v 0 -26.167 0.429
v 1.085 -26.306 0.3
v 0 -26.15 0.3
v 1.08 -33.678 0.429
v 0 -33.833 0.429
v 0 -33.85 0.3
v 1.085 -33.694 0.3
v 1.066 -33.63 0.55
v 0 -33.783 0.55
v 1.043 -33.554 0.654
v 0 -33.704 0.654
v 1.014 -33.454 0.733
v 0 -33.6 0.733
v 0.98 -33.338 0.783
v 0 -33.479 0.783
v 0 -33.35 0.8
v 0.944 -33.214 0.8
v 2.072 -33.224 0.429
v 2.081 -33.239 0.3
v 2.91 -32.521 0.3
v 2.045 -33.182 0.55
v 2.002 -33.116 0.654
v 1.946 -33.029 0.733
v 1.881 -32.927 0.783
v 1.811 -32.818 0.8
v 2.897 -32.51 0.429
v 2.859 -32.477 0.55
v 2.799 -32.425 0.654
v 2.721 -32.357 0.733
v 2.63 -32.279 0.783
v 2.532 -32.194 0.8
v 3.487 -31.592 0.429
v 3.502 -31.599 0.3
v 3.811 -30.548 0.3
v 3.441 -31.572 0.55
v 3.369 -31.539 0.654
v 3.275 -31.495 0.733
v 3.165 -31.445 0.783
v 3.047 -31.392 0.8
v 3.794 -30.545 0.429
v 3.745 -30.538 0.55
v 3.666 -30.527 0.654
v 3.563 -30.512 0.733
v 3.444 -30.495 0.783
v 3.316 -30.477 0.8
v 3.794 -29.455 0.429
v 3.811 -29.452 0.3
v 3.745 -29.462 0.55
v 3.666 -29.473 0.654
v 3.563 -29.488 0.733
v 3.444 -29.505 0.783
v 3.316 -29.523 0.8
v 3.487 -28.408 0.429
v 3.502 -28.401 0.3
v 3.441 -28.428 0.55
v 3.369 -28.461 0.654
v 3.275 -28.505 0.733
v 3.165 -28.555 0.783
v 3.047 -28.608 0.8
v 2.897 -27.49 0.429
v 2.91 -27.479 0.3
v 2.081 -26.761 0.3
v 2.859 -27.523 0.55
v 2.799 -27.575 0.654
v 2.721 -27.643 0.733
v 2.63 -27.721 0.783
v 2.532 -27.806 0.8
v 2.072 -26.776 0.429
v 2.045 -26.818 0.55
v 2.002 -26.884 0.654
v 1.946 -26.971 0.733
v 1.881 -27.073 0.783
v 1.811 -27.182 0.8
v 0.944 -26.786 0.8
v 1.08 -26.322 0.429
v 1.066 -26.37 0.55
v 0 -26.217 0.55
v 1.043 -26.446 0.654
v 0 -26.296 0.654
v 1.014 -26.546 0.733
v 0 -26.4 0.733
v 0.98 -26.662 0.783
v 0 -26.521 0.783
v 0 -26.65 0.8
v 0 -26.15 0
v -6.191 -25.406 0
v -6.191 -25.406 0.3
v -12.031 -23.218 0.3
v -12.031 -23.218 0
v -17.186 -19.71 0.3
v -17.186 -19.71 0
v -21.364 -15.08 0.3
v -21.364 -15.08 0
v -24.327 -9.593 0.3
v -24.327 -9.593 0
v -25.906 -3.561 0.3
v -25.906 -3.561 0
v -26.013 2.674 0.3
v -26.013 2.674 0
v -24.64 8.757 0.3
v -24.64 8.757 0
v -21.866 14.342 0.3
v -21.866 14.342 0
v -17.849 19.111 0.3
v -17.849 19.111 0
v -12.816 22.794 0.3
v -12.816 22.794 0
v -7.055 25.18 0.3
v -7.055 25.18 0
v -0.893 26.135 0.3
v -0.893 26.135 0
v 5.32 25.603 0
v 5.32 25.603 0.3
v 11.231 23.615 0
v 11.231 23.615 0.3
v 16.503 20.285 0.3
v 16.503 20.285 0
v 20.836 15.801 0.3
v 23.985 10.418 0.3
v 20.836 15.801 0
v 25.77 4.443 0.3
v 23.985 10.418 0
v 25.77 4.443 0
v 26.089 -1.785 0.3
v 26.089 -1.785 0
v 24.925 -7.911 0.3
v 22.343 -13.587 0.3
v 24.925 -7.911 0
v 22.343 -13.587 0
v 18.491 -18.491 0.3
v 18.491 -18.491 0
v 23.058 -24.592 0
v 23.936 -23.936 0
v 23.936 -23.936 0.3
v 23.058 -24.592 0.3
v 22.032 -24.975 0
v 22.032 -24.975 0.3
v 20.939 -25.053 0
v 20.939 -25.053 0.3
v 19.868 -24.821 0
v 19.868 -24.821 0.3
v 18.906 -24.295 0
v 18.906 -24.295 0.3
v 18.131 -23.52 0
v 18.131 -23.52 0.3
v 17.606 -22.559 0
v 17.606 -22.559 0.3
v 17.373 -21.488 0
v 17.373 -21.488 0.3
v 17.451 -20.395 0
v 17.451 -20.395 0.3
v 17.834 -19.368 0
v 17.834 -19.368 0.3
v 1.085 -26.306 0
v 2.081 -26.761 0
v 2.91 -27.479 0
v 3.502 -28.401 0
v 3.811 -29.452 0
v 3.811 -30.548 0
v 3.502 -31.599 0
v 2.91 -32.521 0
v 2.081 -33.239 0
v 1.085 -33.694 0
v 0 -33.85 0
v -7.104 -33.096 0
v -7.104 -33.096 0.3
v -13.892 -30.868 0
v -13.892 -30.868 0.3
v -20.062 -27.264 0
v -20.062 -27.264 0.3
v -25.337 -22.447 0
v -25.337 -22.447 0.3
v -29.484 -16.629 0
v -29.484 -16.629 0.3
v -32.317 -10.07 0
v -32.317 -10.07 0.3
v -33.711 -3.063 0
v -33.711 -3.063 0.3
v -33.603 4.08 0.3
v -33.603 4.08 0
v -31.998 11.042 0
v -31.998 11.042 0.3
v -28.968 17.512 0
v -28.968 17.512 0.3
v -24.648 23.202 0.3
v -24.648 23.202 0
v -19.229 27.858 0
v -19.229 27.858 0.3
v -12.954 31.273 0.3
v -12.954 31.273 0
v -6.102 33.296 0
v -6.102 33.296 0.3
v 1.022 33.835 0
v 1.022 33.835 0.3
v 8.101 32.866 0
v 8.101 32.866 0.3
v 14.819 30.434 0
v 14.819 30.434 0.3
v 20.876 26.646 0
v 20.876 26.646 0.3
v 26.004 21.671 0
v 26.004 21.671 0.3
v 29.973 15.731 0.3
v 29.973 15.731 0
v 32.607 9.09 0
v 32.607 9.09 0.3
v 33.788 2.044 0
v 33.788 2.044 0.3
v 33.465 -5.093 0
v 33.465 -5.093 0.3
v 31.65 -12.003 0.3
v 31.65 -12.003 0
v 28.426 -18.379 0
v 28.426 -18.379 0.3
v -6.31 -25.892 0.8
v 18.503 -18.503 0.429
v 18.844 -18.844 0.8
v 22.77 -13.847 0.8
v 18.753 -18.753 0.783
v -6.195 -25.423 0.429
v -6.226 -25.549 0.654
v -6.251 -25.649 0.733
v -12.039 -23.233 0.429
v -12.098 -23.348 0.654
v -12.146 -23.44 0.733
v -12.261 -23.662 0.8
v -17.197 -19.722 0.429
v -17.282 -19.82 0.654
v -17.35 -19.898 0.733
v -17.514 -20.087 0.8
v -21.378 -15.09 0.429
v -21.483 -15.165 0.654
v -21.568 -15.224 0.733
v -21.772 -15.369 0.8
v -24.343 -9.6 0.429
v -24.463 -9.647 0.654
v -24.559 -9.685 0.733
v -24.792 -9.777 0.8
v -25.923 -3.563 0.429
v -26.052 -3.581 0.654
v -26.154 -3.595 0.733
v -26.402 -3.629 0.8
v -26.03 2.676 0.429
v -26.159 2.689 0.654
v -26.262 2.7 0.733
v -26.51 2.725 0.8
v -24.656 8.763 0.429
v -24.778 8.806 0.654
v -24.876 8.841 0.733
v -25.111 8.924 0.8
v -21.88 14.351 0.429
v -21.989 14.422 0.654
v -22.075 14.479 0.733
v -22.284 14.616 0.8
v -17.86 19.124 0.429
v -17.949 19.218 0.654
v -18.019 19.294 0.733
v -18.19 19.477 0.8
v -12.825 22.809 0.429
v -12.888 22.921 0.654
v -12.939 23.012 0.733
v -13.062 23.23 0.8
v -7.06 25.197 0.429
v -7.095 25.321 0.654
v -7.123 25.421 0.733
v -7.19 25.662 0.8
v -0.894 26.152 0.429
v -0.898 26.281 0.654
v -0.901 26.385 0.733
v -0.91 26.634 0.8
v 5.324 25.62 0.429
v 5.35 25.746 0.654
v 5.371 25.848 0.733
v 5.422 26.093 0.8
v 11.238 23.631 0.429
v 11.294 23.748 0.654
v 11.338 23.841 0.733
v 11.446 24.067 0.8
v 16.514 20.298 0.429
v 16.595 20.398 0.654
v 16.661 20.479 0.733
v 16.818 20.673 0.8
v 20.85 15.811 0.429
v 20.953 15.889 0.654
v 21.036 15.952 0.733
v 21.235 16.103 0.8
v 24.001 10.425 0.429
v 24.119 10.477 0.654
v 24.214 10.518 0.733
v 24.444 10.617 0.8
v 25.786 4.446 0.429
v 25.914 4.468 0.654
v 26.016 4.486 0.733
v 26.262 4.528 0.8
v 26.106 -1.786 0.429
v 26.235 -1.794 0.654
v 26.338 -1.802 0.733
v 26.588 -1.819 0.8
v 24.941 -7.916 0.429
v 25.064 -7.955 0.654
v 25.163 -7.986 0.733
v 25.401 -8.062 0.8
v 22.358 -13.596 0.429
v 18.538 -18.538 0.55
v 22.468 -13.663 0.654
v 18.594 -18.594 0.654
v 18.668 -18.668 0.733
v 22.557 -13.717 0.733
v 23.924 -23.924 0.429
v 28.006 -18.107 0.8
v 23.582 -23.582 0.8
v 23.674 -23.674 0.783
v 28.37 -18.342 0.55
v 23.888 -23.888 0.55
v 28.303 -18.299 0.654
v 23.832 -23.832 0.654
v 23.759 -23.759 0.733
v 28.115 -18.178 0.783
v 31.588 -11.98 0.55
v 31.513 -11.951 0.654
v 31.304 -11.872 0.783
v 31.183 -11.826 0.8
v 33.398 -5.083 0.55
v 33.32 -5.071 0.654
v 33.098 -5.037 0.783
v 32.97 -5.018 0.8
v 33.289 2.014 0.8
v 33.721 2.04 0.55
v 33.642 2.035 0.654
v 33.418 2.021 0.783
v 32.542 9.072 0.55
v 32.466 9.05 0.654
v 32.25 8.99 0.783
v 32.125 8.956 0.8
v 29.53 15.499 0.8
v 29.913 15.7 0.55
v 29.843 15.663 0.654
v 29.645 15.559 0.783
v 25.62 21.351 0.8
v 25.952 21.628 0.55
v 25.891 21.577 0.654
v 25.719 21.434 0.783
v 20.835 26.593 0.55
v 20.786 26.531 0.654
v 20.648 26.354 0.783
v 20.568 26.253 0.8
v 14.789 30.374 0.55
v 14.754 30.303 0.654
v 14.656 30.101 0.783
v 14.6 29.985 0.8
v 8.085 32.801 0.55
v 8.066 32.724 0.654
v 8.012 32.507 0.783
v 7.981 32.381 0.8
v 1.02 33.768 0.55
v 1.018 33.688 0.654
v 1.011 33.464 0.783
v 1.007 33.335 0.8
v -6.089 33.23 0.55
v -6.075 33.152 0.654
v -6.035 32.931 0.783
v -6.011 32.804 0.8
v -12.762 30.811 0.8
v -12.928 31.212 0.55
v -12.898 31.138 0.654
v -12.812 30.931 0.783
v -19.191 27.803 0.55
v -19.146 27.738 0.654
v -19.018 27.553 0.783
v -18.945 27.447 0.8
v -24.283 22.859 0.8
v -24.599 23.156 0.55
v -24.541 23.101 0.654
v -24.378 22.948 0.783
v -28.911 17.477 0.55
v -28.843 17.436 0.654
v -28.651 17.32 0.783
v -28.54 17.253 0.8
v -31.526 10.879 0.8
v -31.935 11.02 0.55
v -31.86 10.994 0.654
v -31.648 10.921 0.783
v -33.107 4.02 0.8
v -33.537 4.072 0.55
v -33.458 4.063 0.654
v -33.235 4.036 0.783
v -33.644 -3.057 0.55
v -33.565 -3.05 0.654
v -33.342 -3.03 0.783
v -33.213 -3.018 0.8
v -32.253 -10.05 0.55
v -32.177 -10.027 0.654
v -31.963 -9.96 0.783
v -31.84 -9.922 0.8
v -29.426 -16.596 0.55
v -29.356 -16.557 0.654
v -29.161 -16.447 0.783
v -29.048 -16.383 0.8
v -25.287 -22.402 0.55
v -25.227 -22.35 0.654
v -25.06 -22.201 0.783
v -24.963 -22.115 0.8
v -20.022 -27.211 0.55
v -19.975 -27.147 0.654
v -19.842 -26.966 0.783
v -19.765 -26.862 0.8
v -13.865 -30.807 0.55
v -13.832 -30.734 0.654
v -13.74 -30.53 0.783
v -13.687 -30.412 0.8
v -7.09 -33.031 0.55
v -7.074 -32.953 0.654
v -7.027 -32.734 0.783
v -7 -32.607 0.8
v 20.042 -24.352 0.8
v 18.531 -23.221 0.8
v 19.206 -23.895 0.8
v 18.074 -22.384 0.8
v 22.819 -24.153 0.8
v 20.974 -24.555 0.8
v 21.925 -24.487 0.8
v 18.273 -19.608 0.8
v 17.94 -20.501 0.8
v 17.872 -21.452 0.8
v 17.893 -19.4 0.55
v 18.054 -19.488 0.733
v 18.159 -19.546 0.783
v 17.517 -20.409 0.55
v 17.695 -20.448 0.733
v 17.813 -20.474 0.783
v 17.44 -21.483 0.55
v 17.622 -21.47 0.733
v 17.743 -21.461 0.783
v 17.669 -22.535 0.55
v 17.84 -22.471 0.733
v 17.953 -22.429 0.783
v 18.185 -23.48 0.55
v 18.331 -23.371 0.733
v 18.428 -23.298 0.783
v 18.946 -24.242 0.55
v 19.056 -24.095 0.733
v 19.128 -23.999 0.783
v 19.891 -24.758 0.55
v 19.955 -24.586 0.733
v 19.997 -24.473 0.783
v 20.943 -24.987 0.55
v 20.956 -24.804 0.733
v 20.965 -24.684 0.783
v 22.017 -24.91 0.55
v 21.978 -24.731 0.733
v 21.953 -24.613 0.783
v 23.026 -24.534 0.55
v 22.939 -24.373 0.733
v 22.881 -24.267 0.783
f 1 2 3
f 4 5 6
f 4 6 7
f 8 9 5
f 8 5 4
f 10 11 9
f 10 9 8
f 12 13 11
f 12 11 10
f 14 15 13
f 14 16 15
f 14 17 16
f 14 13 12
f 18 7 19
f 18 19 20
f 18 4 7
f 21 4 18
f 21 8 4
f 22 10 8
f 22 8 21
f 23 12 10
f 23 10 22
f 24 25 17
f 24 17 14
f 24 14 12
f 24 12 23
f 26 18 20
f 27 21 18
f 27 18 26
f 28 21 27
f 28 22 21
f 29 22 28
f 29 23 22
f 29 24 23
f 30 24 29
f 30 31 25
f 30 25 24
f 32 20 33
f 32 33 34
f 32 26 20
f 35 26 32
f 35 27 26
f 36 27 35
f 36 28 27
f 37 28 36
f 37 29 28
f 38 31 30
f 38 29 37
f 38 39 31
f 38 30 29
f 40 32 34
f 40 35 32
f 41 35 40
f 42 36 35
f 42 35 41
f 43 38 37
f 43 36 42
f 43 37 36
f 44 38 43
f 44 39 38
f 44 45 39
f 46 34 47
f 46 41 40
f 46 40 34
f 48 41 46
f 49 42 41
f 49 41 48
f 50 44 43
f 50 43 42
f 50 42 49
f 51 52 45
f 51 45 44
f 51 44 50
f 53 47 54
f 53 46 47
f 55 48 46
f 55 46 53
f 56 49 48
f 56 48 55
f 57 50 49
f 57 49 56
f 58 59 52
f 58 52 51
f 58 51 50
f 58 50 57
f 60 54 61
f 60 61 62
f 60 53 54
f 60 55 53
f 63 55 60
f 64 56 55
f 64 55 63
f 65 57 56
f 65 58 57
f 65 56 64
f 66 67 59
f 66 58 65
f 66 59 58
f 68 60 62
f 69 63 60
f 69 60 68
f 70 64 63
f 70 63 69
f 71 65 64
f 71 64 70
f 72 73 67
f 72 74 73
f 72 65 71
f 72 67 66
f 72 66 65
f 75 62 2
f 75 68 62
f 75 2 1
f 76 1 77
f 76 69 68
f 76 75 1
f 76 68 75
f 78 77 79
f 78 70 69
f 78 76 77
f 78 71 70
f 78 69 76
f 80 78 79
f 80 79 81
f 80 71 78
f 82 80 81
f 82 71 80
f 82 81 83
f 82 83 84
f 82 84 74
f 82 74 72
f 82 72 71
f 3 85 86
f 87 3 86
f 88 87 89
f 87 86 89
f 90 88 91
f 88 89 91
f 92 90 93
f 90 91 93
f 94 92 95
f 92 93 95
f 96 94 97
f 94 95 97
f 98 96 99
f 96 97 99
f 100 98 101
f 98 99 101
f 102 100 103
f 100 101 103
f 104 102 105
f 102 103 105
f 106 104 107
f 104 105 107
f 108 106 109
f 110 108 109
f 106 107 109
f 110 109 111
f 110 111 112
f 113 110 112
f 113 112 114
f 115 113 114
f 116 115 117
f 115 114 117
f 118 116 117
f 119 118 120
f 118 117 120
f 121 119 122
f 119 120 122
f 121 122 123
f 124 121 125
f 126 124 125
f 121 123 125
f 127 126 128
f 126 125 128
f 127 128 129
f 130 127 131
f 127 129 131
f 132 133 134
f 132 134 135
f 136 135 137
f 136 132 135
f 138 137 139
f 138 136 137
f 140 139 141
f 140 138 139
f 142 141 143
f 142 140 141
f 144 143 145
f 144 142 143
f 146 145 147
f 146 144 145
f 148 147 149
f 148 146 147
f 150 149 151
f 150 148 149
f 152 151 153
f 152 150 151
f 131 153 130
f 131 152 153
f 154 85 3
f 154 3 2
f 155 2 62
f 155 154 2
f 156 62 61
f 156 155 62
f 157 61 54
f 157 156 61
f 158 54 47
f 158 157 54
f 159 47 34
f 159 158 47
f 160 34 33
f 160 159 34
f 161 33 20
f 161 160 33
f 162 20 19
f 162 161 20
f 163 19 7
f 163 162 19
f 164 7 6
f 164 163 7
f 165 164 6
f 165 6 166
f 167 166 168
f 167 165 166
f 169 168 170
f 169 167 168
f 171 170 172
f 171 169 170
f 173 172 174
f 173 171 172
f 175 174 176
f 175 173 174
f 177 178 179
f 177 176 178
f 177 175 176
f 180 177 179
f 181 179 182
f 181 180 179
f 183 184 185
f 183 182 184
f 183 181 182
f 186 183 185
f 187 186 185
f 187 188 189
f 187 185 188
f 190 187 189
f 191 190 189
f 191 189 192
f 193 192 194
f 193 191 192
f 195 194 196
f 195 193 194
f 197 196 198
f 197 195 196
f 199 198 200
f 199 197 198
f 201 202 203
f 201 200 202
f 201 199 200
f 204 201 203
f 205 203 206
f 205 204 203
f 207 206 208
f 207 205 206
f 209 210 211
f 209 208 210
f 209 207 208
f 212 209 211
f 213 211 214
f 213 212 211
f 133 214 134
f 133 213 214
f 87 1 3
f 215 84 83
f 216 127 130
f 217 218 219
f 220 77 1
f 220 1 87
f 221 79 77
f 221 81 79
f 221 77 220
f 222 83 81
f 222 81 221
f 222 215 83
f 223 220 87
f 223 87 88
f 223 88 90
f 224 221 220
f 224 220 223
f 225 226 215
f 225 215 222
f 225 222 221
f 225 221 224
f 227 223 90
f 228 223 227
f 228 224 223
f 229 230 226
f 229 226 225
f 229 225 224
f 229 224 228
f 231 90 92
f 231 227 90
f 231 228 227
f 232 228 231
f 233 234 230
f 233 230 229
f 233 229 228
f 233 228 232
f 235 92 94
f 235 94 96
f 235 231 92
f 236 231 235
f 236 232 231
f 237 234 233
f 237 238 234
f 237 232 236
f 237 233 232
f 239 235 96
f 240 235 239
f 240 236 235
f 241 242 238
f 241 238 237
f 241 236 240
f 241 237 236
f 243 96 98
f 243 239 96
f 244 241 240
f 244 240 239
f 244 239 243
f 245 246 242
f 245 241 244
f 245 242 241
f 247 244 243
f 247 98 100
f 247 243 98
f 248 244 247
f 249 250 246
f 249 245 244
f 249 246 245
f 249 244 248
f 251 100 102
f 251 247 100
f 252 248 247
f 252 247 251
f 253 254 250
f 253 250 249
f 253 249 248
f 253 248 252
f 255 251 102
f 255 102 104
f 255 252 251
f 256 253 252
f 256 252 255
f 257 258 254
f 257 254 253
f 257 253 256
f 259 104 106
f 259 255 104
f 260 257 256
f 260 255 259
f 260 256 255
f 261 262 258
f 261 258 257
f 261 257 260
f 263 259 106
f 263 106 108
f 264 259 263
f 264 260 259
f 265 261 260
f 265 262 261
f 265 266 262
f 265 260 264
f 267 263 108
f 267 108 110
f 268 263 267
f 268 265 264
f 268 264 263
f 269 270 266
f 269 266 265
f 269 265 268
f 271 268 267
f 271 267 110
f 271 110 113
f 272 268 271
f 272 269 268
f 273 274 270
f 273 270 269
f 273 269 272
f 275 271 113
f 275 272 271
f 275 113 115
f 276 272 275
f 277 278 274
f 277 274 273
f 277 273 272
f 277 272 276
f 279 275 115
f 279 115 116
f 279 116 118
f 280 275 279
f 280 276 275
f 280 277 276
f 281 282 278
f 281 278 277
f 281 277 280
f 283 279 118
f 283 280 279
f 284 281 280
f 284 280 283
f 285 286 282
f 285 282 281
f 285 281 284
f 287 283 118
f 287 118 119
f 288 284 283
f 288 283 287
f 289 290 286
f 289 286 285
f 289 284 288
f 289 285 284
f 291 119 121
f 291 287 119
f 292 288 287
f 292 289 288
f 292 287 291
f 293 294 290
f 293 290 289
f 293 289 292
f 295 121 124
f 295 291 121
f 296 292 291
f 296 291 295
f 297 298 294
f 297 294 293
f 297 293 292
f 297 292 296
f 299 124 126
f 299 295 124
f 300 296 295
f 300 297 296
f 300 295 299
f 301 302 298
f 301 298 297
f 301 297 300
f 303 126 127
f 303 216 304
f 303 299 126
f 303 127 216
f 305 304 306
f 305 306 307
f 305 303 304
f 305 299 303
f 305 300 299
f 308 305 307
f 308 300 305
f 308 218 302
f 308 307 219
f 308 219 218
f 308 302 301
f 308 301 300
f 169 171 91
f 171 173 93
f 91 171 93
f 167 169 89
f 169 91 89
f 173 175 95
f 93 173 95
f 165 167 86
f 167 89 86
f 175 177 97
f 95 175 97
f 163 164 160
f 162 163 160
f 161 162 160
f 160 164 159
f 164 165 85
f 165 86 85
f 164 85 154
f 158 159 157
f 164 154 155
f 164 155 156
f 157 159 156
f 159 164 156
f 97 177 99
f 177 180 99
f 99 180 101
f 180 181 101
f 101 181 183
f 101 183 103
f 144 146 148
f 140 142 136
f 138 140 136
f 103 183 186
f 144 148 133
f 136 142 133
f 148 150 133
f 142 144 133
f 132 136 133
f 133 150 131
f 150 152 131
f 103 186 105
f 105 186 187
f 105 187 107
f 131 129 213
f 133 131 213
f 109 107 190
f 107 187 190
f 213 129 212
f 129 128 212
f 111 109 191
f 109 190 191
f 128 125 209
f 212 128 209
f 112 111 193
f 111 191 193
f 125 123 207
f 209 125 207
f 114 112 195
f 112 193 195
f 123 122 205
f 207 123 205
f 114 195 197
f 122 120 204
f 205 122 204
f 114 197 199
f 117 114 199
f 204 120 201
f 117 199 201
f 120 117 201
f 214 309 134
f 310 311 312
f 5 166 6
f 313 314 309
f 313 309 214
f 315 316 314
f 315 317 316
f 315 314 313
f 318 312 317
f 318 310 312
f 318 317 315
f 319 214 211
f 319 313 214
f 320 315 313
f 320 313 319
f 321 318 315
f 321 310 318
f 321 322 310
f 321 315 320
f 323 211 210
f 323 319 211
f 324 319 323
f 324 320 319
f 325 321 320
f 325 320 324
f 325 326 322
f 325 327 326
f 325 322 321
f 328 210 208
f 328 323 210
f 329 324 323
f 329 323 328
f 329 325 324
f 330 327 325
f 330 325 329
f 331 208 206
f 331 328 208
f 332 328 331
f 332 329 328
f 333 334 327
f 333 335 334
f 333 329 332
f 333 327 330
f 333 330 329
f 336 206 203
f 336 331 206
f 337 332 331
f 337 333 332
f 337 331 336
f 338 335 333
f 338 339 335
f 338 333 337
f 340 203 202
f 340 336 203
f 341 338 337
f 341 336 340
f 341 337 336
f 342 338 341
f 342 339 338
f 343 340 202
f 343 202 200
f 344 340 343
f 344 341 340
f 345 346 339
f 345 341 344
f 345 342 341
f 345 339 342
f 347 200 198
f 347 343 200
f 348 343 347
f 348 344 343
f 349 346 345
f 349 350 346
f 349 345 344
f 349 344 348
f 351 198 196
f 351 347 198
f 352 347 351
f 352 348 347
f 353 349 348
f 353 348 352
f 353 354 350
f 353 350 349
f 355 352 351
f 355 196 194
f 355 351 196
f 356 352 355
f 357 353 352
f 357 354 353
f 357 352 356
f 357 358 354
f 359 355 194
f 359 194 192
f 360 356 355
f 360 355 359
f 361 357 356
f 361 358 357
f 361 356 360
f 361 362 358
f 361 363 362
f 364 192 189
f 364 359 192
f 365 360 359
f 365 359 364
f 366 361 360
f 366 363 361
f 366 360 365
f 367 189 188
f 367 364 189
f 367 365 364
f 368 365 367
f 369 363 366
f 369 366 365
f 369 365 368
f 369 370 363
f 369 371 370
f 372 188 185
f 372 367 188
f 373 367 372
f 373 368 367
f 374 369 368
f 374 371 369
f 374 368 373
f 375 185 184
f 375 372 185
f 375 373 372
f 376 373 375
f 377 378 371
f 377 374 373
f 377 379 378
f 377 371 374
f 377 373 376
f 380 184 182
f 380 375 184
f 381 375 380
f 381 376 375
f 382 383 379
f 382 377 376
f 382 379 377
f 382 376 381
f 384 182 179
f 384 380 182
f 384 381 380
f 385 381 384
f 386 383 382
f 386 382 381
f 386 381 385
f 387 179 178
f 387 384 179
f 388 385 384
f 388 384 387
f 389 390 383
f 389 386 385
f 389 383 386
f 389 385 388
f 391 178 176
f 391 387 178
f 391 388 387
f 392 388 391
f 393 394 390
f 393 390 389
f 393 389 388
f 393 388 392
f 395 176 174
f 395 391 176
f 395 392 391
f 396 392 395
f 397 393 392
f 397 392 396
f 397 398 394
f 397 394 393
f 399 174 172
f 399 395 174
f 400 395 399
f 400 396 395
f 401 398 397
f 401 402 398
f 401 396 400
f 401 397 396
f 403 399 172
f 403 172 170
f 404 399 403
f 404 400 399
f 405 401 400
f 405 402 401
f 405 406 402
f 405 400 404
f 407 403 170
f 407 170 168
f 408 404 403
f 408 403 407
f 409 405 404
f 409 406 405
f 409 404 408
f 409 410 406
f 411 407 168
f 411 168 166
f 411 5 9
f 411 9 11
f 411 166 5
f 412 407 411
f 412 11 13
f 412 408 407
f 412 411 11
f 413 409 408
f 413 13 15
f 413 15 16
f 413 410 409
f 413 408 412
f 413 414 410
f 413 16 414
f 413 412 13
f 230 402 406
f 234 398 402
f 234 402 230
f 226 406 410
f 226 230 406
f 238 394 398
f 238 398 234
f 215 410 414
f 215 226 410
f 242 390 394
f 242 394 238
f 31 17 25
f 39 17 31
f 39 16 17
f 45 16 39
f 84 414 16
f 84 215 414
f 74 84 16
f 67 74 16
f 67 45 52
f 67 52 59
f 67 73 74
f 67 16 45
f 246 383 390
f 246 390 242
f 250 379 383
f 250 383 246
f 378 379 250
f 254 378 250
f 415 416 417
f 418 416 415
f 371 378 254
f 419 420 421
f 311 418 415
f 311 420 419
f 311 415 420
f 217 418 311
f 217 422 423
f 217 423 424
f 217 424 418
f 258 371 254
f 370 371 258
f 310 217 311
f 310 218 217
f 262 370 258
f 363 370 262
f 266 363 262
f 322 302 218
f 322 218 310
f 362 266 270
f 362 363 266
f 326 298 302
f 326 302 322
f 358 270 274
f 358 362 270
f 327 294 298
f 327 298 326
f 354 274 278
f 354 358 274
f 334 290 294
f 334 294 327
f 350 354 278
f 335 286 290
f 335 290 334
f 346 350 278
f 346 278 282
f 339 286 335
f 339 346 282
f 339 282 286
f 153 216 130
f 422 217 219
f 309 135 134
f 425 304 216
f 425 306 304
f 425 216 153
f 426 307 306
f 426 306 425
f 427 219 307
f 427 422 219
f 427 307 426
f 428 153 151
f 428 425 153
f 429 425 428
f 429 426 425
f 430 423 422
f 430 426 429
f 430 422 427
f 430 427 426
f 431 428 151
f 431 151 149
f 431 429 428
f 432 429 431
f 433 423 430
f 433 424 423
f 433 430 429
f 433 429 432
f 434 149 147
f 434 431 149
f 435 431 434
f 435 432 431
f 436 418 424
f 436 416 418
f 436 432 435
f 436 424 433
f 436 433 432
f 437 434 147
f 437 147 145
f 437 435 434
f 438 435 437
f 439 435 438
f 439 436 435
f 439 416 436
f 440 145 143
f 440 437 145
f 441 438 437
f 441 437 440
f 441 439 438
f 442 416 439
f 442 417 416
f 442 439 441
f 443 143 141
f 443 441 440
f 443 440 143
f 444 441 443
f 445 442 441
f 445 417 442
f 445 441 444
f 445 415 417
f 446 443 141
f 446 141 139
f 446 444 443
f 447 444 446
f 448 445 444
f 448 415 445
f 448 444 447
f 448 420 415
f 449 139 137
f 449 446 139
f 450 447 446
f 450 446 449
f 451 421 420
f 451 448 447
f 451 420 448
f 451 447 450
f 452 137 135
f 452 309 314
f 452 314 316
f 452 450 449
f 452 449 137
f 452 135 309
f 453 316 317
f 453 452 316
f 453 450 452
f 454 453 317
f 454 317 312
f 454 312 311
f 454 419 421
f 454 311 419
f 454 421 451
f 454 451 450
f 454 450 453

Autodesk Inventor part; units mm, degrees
ref_plane "YZ Plane" through (0, 0, 0) normal (1, 0, 0) x (0, 1, 0)
ref_plane "XZ Plane" through (0, 0, 0) normal (0, 1, 0) x (-1, 0, 0)
ref_plane "XY Plane" through (0, 0, 0) normal (0, 0, 1) x (1, 0, 0)
sketch "Block1" plane through (0, 0, 0) normal (0, 0, 1) x (1, 0, 0)
  circle A0 centre (250, 0) radius 40 construction
  arc A1 (284, 0) -> (274.0416, -24.0416) centre (250, 0) ccw construction
  circle A2 centre (250, 0) radius 10.05 construction
  arc A3 (276, 0) -> (268.3848, -18.3848) centre (250, 0) ccw construction
  circle A4 centre (280, 0) radius 1.6 construction
  arc A5 (276, 0) -> (284, 0) centre (280, 0) ccw construction
  circle A6 centre (271.2132, -21.2132) radius 1.6 construction
  arc A7 (274.0416, -24.0416) -> (268.3848, -18.3848) centre (271.2132, -21.2132) ccw construction
  point P0 (269.205, -7.955)
  dimension "d0" = 8
sketch "Sketch1" plane through (0, 0, 0) normal (0, 0, 1) x (1, 0, 0)
  arc A0 (18.4908, -18.4908) -> (0, -26.15) centre (0, 0) ccw
  arc A1 (23.9356, -23.9356) -> (0, -33.85) centre (0, 0) ccw
  arc A2 (0, -33.85) -> (0, -26.15) centre (0, -30) ccw
  circle A3 centre (0, -30) radius 2.9
  arc A4 (18.4908, -18.4908) -> (23.9356, -23.9356) centre (21.2132, -21.2132) ccw
  circle A5 centre (21.2132, -21.2132) radius 2.9
  circle A6 centre (30, 0) radius 2.9
  circle A7 centre (21.2132, 21.2132) radius 2.9
  circle A8 centre (0, 30) radius 2.9
  circle A9 centre (-21.2132, 21.2132) radius 2.9
  circle A10 centre (-30, 0) radius 2.9
  circle A11 centre (-21.2132, -21.2132) radius 2.9
  point P0 (0, 0)
  point P1 (0, 0)
  dimension "d1" = 0.15
  dimension "d2" = 5.8
  dimension "d5" = 360
extrude "Extrusion1" add sketch "Sketch1" along normal blind 0.2
sketch "Sketch2" plane through (0, 0, 0.2) normal (0, 0, 1) x (1, 0, 0)
  arc A0 (23.9356, -23.9356) -> (0, -33.85) centre (0, 0) ccw projected
  arc A1 (0, -33.85) -> (0, -26.15) centre (0, -30) ccw projected
  arc A2 (18.4908, -18.4908) -> (0, -26.15) centre (0, 0) ccw projected
  arc A3 (18.4908, -18.4908) -> (23.9356, -23.9356) centre (21.2132, -21.2132) ccw projected
  circle A4 centre (0, 30) radius 2.9 projected
  circle A5 centre (30, 0) radius 2.9 projected
  circle A6 centre (21.2132, -21.2132) radius 2.9 projected
  circle A7 centre (-30, 0) radius 2.9 projected
  circle A8 centre (-21.2132, -21.2132) radius 2.9 projected
  circle A9 centre (-21.2132, 21.2132) radius 2.9 projected
  circle A10 centre (21.2132, 21.2132) radius 2.9 projected
  circle A11 centre (0, -30) radius 2.9 projected
  point P0 (0, 0)
extrude "Extrusion2" add sketch "Sketch2" along normal blind 0.6 contours A3 A2 A1 A0 | A4 | A5 | A6 | A7 | A8 | A9 | A10 | A11
fillet "Fillet1" radius 0.5 4 edges at (3.85, -30, 0.8) (-10.0072, 24.1594, 0.8) (18.4908, -23.9356, 0.8) (-12.9538, 31.2733, 0.8)
sketch "Sketch3" plane through (0, 0, 0) normal (0, 0, -1) x (-1, 0, 0)
  circle A0 centre (0, -30) radius 2.9 projected
  circle A1 centre (-21.2132, -21.2132) radius 2.9 projected
  circle A2 centre (-30, 0) radius 2.9 projected
  circle A3 centre (-21.2132, 21.2132) radius 2.9 projected
  circle A4 centre (0, 30) radius 2.9 projected
  circle A5 centre (21.2132, 21.2132) radius 2.9 projected
  circle A6 centre (30, 0) radius 2.9 projected
  circle A7 centre (21.2132, -21.2132) radius 2.9 projected
  point P0 (0, 0)
extrude "Extrusion3" add sketch "Sketch3" against normal up to surface (0.2 mm away)
properties part number "LogoCoverThin"
